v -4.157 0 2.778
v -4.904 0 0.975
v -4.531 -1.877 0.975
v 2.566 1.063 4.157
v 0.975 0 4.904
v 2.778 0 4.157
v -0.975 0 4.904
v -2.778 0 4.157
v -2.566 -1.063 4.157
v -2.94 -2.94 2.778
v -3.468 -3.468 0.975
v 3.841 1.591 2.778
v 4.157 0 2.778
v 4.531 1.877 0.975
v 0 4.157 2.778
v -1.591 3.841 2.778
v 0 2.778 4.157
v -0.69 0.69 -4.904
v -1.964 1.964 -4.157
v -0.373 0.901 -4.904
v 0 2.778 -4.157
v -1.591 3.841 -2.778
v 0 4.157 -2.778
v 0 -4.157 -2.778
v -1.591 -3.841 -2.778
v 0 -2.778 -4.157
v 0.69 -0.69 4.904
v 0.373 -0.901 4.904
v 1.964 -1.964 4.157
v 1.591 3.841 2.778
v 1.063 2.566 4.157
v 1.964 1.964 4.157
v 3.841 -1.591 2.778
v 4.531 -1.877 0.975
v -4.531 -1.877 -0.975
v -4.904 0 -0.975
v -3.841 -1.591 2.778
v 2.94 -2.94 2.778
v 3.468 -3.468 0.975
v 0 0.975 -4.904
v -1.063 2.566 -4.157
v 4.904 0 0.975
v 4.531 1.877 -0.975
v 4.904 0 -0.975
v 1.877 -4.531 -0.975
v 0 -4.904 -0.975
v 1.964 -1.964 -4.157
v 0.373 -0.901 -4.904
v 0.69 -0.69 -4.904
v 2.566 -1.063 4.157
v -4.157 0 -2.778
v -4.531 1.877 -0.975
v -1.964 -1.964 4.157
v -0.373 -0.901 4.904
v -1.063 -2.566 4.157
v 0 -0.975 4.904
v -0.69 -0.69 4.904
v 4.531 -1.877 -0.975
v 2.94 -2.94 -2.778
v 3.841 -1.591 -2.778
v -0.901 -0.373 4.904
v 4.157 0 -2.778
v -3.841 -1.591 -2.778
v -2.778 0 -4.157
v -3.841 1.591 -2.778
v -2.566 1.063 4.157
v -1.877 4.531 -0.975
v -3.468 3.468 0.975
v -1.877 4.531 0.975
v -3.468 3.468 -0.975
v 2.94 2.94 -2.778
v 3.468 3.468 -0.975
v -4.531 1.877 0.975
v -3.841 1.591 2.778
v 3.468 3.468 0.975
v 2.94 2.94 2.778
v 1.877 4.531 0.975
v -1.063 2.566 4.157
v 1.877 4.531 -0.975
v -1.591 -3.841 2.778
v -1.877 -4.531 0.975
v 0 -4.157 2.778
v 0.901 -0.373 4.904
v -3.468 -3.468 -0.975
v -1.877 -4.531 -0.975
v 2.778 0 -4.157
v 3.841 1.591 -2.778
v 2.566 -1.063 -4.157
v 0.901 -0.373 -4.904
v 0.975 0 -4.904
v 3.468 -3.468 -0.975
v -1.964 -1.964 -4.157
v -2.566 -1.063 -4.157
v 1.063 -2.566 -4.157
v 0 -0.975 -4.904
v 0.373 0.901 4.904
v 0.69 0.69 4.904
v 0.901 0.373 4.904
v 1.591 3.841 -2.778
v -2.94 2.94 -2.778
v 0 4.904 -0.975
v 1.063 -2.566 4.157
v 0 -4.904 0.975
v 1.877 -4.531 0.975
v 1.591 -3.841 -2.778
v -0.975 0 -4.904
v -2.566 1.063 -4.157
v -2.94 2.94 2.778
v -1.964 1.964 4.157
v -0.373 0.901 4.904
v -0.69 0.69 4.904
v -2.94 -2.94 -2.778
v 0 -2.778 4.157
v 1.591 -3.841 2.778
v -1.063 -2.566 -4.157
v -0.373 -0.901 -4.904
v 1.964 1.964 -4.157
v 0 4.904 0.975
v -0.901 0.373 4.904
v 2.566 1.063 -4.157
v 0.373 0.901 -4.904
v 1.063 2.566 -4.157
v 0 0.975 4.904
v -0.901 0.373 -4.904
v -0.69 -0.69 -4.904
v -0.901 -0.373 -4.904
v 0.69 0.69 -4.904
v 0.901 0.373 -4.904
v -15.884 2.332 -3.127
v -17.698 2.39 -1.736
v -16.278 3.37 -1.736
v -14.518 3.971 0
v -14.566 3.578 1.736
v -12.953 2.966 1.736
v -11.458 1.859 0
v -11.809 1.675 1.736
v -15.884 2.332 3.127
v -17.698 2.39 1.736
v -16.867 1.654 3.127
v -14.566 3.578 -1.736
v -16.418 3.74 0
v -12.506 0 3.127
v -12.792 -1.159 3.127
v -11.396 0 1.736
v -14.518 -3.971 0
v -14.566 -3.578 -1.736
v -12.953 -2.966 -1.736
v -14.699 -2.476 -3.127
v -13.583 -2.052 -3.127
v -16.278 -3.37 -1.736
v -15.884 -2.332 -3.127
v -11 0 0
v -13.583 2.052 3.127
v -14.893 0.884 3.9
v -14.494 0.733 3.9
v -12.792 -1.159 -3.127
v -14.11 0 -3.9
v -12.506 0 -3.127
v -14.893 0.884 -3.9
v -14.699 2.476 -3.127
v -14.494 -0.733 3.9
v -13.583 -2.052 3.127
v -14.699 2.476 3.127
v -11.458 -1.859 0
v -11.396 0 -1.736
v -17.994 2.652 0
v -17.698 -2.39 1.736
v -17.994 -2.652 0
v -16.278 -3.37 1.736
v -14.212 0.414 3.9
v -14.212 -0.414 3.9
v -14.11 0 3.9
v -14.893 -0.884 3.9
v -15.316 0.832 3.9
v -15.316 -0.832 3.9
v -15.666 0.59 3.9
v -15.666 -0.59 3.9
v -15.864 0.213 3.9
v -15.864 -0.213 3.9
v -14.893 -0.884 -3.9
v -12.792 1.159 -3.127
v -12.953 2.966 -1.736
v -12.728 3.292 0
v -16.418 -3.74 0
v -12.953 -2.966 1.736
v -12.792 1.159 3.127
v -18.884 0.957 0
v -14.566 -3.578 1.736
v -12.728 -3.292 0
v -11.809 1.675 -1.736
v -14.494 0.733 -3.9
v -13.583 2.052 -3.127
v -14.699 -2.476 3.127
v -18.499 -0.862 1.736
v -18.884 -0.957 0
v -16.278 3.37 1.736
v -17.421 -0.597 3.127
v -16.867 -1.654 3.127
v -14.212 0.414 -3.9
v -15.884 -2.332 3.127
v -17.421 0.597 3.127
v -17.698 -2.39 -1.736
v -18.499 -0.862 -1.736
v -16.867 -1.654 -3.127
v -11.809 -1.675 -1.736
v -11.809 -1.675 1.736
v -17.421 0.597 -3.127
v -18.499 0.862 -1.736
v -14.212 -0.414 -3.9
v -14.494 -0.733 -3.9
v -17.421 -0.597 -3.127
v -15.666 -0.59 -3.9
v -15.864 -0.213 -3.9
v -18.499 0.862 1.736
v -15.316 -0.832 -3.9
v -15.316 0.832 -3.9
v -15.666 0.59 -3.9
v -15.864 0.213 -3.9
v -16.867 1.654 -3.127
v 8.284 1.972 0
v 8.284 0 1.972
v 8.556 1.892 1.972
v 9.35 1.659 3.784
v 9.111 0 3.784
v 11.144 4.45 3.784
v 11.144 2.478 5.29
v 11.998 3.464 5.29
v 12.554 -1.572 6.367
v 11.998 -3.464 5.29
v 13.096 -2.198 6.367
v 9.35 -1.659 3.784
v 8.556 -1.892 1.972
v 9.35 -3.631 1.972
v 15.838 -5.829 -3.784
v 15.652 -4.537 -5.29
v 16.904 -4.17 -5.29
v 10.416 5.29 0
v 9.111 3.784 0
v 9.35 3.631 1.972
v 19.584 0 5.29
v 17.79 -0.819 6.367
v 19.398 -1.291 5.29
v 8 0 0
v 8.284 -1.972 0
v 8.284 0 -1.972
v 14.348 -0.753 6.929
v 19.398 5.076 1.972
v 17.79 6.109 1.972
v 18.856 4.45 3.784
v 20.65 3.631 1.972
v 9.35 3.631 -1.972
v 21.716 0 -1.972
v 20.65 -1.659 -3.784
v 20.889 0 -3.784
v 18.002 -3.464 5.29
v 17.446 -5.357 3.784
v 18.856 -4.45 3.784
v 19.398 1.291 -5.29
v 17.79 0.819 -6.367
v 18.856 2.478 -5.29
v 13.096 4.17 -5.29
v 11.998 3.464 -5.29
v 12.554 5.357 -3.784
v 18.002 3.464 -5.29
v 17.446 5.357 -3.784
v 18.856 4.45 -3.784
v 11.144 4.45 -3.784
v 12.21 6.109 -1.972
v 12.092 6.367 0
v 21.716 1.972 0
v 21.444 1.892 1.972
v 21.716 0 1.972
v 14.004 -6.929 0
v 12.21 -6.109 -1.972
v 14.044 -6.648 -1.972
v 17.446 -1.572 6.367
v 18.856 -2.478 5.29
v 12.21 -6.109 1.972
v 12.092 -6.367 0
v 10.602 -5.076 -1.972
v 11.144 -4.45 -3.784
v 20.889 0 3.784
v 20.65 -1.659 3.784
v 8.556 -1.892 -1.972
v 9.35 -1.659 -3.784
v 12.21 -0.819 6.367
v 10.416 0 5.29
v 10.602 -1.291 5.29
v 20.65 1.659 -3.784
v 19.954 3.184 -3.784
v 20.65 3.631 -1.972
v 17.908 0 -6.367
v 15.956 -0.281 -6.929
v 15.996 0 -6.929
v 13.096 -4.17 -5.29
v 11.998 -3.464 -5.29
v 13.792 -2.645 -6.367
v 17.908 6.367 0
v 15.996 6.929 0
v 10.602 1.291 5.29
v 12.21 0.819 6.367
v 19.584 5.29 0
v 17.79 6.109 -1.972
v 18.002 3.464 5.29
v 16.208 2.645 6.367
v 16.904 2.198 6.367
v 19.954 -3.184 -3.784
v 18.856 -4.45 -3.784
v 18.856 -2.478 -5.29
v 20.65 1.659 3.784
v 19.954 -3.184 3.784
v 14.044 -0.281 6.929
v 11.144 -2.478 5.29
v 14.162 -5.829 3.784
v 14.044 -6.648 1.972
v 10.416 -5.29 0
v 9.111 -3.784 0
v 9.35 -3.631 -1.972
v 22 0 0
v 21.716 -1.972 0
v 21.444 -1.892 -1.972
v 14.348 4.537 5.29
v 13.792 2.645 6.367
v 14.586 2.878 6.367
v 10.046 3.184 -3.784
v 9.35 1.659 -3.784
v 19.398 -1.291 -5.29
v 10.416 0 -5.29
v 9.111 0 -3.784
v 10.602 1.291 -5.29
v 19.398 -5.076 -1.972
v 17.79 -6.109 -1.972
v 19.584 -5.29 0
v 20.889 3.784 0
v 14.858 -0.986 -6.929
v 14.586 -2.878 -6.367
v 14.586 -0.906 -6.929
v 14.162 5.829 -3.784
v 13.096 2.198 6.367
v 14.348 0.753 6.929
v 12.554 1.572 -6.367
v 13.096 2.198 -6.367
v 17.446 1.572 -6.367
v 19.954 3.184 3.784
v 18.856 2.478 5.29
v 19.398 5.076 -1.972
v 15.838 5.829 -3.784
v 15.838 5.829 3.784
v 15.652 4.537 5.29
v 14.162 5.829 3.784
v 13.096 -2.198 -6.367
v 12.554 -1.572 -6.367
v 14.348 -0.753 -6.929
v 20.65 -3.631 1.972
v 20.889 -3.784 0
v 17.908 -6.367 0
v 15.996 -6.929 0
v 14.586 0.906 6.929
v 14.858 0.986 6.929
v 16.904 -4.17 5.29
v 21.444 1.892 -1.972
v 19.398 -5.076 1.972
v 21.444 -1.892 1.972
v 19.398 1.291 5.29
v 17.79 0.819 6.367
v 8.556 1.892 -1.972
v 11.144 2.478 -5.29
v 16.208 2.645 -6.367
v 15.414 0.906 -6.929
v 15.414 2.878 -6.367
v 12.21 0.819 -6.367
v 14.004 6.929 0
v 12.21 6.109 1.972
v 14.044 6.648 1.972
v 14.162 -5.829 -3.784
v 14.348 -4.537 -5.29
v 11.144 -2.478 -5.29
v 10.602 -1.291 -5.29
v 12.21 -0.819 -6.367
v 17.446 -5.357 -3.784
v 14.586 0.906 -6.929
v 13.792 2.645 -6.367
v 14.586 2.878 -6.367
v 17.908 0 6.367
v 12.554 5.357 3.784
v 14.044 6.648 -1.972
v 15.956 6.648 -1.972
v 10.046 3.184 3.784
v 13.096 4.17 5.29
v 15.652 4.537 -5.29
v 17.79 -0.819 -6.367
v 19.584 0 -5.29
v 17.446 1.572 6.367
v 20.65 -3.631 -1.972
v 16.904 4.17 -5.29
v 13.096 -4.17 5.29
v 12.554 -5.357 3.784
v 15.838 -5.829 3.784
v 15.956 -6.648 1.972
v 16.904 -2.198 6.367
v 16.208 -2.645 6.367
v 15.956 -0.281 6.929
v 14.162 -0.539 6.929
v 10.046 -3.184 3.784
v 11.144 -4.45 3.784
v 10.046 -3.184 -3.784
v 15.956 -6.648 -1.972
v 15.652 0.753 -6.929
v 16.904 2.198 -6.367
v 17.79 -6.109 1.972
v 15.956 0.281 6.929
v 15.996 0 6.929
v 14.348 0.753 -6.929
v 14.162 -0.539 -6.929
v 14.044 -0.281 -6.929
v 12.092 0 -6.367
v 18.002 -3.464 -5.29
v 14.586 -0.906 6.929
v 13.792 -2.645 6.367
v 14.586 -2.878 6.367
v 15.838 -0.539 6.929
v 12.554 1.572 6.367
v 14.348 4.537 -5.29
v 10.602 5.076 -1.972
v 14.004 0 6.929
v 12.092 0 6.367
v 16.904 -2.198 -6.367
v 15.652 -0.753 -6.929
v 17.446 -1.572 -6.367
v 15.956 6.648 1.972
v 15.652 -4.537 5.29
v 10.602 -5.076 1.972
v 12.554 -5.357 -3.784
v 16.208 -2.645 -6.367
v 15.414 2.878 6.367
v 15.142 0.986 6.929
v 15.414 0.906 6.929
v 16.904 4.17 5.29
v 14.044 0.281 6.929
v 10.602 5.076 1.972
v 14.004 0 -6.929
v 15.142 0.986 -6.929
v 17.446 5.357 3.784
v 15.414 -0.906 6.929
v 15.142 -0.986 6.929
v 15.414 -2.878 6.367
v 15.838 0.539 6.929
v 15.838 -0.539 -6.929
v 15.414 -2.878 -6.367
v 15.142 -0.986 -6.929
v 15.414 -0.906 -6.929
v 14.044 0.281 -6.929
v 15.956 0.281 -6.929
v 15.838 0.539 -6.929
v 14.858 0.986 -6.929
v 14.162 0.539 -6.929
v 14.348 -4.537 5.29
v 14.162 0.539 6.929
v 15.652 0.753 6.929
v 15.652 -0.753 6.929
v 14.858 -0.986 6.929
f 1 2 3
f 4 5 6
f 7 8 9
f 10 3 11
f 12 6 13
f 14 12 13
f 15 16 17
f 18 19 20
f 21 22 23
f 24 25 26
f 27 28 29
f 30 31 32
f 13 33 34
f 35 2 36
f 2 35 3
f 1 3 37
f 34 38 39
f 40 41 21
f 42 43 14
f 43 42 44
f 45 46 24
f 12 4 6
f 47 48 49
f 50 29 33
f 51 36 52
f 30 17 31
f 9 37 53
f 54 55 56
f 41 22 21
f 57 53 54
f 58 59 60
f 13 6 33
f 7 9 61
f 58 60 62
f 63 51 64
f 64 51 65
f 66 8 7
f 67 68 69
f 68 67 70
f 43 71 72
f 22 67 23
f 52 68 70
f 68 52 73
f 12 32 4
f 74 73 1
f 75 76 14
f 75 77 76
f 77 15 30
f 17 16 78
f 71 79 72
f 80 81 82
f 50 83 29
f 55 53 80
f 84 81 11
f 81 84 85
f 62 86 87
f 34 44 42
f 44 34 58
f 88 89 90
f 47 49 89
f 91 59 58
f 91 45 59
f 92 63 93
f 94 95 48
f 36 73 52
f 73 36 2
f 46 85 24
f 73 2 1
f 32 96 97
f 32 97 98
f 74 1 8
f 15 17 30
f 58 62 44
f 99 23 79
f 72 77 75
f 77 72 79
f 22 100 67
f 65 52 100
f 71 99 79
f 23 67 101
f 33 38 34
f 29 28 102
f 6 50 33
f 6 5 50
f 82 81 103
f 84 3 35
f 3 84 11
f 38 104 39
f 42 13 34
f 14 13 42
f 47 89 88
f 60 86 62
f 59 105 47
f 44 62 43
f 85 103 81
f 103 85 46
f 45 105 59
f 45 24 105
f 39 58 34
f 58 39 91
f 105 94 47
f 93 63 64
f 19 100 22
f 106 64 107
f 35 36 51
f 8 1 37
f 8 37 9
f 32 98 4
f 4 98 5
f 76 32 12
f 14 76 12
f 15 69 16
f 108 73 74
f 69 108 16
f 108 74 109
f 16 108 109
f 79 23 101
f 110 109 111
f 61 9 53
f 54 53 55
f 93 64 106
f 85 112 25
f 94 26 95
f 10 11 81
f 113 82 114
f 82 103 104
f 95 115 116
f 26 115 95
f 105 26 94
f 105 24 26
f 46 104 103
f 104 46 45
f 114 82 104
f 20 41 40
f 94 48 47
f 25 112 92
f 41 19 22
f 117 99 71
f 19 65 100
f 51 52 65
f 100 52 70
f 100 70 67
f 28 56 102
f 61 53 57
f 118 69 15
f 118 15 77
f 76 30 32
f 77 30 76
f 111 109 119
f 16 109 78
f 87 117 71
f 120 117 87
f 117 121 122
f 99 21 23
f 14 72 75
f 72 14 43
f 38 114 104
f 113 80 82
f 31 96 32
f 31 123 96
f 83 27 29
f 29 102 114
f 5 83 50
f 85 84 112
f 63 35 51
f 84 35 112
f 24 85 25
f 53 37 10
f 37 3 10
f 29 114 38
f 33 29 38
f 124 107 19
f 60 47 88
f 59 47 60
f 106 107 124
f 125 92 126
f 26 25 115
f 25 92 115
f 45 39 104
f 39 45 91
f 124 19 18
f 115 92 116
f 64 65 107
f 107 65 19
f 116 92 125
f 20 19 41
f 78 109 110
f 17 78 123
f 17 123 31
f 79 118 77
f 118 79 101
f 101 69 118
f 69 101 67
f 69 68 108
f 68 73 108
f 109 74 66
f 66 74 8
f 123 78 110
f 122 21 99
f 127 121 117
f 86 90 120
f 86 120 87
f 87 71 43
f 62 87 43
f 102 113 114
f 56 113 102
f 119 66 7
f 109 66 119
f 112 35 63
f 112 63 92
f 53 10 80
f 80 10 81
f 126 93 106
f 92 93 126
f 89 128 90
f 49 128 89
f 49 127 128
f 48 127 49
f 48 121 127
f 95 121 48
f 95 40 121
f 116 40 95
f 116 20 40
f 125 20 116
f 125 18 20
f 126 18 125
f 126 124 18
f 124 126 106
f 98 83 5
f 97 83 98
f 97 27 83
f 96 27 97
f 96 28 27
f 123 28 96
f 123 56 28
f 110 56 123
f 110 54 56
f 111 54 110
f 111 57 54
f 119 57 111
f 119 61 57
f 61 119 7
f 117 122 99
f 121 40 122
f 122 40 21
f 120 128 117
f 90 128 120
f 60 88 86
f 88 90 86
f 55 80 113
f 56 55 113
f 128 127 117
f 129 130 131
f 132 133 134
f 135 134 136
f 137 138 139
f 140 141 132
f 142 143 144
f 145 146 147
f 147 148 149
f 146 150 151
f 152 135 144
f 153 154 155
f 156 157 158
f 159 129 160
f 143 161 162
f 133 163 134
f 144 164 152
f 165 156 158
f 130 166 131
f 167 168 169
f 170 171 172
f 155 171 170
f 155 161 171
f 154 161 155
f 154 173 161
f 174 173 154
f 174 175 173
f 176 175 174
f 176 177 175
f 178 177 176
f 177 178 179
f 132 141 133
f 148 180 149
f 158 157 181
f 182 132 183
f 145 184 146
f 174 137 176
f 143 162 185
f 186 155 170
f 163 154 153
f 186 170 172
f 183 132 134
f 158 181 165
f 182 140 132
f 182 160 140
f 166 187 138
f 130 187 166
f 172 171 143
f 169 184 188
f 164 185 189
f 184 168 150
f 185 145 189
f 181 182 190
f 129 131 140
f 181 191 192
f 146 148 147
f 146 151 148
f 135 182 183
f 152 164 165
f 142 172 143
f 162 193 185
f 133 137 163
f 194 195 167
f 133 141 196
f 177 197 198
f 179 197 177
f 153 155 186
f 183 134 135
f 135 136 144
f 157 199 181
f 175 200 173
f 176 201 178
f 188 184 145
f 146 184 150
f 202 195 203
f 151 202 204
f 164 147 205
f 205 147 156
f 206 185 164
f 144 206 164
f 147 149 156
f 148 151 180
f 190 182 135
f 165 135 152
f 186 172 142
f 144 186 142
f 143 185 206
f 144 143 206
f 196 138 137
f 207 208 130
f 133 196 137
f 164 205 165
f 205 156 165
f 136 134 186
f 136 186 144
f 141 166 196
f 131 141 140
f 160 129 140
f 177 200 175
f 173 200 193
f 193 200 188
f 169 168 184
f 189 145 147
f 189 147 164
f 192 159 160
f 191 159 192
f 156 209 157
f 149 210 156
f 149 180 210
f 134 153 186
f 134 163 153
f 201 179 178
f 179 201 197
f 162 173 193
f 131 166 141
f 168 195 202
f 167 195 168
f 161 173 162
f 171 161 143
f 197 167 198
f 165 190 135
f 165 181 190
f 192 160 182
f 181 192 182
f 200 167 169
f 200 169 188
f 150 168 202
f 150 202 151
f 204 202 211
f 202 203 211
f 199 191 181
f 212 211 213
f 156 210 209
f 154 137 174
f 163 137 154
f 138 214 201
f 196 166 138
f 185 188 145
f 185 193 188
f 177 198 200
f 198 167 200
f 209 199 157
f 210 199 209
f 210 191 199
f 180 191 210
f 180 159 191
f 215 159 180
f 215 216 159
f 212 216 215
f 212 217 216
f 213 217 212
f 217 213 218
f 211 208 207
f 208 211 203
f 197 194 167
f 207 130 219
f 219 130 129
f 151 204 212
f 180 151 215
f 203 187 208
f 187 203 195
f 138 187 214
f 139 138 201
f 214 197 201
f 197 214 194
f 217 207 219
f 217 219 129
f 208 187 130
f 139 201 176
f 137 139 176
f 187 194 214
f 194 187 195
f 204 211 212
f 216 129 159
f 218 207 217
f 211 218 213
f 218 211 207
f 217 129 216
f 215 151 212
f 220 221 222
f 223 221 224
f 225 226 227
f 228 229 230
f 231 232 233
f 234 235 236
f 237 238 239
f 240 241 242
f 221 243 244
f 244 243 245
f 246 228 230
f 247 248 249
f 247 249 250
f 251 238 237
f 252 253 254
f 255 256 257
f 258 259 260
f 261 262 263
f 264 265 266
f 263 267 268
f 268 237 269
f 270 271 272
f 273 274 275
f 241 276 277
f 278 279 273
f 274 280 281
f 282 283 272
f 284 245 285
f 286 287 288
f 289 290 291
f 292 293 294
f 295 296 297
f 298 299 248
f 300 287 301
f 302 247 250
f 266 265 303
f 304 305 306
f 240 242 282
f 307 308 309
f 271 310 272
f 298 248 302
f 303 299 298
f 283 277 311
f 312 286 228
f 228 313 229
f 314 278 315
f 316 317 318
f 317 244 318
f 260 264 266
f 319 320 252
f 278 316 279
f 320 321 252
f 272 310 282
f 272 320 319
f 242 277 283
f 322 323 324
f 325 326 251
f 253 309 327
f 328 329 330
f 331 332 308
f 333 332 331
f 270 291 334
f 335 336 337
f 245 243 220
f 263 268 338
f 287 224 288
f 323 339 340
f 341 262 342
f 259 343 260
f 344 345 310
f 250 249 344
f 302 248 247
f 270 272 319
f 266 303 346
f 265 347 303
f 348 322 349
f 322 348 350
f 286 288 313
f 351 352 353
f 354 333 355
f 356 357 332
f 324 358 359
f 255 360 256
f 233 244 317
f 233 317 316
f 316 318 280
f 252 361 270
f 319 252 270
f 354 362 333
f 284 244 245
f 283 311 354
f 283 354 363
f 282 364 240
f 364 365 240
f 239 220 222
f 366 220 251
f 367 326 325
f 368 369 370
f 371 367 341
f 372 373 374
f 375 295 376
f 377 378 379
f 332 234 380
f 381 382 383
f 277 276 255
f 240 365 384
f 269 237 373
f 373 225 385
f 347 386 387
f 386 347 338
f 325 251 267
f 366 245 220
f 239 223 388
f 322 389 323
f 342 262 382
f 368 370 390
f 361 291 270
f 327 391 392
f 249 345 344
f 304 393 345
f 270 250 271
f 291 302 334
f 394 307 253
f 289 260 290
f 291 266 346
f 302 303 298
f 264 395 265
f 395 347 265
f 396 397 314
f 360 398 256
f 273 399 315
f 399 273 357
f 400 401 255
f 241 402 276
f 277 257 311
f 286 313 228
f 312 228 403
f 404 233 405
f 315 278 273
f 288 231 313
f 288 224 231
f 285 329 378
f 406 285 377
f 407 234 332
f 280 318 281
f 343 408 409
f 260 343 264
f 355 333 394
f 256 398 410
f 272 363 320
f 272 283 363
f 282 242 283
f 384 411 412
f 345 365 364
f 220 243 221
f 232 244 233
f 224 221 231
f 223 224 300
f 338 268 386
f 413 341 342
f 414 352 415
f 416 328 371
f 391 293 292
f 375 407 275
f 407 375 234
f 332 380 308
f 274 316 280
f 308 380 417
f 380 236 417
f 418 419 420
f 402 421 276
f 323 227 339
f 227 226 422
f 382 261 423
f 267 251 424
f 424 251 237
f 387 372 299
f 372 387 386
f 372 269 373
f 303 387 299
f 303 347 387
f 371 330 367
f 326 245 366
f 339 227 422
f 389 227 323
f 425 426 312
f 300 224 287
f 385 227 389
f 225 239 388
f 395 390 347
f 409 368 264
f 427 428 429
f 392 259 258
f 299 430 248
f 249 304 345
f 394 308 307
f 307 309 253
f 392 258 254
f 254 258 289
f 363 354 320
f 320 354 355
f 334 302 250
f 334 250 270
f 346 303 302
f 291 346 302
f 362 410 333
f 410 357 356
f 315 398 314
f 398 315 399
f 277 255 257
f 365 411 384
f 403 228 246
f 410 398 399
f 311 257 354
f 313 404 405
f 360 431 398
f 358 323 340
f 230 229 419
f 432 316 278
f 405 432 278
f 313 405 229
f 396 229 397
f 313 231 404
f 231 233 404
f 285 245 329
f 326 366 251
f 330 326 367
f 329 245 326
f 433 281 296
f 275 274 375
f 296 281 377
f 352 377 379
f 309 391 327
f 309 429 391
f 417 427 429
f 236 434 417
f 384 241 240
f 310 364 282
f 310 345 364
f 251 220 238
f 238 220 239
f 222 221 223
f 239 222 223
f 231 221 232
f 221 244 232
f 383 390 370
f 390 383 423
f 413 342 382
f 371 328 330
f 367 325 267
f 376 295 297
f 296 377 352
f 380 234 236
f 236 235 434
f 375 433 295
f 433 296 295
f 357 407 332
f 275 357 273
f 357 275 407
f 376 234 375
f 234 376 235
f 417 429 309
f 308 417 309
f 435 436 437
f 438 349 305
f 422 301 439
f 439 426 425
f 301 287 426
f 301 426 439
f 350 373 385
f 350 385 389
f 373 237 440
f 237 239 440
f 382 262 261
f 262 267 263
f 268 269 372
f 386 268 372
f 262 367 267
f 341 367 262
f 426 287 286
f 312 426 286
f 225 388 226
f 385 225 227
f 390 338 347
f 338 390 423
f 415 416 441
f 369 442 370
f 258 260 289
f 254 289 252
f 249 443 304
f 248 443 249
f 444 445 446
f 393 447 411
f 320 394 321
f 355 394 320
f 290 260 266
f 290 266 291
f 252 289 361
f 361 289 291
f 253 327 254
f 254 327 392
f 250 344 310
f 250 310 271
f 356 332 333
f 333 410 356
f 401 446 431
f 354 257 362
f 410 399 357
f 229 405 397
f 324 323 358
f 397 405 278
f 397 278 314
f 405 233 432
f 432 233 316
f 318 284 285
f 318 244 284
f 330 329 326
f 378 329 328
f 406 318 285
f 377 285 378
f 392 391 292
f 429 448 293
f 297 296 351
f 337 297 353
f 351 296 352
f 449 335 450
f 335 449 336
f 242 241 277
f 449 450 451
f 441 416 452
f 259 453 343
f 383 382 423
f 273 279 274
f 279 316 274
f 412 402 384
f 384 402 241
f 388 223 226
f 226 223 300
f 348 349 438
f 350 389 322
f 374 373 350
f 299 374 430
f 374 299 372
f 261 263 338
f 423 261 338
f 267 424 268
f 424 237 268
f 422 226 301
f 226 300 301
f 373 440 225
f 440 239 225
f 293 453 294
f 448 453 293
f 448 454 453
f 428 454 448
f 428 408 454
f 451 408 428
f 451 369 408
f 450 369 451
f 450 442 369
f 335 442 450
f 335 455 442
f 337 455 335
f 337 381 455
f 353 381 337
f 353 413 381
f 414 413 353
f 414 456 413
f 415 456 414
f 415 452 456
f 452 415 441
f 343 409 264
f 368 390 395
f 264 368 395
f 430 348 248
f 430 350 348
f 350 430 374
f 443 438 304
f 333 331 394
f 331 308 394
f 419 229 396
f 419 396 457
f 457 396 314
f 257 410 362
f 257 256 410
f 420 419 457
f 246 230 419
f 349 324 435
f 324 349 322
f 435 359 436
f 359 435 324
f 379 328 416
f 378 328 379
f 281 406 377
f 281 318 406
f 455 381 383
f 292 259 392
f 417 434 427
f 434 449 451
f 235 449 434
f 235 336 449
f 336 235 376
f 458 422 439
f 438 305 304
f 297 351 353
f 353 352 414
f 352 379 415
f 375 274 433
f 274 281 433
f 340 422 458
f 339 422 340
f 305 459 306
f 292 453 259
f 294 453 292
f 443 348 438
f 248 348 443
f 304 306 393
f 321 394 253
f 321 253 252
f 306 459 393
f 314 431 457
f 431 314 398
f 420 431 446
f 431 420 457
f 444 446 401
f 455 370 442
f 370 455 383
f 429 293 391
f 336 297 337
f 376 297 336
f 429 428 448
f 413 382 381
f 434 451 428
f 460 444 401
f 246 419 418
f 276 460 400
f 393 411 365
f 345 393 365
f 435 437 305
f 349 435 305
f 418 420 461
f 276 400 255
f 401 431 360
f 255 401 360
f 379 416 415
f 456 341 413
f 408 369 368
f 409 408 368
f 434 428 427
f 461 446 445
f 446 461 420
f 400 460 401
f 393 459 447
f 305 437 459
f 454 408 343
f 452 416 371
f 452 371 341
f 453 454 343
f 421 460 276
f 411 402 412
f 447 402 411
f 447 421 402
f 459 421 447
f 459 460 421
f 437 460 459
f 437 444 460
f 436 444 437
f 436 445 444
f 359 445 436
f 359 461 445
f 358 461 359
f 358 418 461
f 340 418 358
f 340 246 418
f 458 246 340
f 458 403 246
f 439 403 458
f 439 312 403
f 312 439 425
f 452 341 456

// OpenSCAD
sphere(r = 5);

translate([-15, 0, 0]) sphere(r = 4);

translate([15, 0, 0]) sphere(r = 7);
